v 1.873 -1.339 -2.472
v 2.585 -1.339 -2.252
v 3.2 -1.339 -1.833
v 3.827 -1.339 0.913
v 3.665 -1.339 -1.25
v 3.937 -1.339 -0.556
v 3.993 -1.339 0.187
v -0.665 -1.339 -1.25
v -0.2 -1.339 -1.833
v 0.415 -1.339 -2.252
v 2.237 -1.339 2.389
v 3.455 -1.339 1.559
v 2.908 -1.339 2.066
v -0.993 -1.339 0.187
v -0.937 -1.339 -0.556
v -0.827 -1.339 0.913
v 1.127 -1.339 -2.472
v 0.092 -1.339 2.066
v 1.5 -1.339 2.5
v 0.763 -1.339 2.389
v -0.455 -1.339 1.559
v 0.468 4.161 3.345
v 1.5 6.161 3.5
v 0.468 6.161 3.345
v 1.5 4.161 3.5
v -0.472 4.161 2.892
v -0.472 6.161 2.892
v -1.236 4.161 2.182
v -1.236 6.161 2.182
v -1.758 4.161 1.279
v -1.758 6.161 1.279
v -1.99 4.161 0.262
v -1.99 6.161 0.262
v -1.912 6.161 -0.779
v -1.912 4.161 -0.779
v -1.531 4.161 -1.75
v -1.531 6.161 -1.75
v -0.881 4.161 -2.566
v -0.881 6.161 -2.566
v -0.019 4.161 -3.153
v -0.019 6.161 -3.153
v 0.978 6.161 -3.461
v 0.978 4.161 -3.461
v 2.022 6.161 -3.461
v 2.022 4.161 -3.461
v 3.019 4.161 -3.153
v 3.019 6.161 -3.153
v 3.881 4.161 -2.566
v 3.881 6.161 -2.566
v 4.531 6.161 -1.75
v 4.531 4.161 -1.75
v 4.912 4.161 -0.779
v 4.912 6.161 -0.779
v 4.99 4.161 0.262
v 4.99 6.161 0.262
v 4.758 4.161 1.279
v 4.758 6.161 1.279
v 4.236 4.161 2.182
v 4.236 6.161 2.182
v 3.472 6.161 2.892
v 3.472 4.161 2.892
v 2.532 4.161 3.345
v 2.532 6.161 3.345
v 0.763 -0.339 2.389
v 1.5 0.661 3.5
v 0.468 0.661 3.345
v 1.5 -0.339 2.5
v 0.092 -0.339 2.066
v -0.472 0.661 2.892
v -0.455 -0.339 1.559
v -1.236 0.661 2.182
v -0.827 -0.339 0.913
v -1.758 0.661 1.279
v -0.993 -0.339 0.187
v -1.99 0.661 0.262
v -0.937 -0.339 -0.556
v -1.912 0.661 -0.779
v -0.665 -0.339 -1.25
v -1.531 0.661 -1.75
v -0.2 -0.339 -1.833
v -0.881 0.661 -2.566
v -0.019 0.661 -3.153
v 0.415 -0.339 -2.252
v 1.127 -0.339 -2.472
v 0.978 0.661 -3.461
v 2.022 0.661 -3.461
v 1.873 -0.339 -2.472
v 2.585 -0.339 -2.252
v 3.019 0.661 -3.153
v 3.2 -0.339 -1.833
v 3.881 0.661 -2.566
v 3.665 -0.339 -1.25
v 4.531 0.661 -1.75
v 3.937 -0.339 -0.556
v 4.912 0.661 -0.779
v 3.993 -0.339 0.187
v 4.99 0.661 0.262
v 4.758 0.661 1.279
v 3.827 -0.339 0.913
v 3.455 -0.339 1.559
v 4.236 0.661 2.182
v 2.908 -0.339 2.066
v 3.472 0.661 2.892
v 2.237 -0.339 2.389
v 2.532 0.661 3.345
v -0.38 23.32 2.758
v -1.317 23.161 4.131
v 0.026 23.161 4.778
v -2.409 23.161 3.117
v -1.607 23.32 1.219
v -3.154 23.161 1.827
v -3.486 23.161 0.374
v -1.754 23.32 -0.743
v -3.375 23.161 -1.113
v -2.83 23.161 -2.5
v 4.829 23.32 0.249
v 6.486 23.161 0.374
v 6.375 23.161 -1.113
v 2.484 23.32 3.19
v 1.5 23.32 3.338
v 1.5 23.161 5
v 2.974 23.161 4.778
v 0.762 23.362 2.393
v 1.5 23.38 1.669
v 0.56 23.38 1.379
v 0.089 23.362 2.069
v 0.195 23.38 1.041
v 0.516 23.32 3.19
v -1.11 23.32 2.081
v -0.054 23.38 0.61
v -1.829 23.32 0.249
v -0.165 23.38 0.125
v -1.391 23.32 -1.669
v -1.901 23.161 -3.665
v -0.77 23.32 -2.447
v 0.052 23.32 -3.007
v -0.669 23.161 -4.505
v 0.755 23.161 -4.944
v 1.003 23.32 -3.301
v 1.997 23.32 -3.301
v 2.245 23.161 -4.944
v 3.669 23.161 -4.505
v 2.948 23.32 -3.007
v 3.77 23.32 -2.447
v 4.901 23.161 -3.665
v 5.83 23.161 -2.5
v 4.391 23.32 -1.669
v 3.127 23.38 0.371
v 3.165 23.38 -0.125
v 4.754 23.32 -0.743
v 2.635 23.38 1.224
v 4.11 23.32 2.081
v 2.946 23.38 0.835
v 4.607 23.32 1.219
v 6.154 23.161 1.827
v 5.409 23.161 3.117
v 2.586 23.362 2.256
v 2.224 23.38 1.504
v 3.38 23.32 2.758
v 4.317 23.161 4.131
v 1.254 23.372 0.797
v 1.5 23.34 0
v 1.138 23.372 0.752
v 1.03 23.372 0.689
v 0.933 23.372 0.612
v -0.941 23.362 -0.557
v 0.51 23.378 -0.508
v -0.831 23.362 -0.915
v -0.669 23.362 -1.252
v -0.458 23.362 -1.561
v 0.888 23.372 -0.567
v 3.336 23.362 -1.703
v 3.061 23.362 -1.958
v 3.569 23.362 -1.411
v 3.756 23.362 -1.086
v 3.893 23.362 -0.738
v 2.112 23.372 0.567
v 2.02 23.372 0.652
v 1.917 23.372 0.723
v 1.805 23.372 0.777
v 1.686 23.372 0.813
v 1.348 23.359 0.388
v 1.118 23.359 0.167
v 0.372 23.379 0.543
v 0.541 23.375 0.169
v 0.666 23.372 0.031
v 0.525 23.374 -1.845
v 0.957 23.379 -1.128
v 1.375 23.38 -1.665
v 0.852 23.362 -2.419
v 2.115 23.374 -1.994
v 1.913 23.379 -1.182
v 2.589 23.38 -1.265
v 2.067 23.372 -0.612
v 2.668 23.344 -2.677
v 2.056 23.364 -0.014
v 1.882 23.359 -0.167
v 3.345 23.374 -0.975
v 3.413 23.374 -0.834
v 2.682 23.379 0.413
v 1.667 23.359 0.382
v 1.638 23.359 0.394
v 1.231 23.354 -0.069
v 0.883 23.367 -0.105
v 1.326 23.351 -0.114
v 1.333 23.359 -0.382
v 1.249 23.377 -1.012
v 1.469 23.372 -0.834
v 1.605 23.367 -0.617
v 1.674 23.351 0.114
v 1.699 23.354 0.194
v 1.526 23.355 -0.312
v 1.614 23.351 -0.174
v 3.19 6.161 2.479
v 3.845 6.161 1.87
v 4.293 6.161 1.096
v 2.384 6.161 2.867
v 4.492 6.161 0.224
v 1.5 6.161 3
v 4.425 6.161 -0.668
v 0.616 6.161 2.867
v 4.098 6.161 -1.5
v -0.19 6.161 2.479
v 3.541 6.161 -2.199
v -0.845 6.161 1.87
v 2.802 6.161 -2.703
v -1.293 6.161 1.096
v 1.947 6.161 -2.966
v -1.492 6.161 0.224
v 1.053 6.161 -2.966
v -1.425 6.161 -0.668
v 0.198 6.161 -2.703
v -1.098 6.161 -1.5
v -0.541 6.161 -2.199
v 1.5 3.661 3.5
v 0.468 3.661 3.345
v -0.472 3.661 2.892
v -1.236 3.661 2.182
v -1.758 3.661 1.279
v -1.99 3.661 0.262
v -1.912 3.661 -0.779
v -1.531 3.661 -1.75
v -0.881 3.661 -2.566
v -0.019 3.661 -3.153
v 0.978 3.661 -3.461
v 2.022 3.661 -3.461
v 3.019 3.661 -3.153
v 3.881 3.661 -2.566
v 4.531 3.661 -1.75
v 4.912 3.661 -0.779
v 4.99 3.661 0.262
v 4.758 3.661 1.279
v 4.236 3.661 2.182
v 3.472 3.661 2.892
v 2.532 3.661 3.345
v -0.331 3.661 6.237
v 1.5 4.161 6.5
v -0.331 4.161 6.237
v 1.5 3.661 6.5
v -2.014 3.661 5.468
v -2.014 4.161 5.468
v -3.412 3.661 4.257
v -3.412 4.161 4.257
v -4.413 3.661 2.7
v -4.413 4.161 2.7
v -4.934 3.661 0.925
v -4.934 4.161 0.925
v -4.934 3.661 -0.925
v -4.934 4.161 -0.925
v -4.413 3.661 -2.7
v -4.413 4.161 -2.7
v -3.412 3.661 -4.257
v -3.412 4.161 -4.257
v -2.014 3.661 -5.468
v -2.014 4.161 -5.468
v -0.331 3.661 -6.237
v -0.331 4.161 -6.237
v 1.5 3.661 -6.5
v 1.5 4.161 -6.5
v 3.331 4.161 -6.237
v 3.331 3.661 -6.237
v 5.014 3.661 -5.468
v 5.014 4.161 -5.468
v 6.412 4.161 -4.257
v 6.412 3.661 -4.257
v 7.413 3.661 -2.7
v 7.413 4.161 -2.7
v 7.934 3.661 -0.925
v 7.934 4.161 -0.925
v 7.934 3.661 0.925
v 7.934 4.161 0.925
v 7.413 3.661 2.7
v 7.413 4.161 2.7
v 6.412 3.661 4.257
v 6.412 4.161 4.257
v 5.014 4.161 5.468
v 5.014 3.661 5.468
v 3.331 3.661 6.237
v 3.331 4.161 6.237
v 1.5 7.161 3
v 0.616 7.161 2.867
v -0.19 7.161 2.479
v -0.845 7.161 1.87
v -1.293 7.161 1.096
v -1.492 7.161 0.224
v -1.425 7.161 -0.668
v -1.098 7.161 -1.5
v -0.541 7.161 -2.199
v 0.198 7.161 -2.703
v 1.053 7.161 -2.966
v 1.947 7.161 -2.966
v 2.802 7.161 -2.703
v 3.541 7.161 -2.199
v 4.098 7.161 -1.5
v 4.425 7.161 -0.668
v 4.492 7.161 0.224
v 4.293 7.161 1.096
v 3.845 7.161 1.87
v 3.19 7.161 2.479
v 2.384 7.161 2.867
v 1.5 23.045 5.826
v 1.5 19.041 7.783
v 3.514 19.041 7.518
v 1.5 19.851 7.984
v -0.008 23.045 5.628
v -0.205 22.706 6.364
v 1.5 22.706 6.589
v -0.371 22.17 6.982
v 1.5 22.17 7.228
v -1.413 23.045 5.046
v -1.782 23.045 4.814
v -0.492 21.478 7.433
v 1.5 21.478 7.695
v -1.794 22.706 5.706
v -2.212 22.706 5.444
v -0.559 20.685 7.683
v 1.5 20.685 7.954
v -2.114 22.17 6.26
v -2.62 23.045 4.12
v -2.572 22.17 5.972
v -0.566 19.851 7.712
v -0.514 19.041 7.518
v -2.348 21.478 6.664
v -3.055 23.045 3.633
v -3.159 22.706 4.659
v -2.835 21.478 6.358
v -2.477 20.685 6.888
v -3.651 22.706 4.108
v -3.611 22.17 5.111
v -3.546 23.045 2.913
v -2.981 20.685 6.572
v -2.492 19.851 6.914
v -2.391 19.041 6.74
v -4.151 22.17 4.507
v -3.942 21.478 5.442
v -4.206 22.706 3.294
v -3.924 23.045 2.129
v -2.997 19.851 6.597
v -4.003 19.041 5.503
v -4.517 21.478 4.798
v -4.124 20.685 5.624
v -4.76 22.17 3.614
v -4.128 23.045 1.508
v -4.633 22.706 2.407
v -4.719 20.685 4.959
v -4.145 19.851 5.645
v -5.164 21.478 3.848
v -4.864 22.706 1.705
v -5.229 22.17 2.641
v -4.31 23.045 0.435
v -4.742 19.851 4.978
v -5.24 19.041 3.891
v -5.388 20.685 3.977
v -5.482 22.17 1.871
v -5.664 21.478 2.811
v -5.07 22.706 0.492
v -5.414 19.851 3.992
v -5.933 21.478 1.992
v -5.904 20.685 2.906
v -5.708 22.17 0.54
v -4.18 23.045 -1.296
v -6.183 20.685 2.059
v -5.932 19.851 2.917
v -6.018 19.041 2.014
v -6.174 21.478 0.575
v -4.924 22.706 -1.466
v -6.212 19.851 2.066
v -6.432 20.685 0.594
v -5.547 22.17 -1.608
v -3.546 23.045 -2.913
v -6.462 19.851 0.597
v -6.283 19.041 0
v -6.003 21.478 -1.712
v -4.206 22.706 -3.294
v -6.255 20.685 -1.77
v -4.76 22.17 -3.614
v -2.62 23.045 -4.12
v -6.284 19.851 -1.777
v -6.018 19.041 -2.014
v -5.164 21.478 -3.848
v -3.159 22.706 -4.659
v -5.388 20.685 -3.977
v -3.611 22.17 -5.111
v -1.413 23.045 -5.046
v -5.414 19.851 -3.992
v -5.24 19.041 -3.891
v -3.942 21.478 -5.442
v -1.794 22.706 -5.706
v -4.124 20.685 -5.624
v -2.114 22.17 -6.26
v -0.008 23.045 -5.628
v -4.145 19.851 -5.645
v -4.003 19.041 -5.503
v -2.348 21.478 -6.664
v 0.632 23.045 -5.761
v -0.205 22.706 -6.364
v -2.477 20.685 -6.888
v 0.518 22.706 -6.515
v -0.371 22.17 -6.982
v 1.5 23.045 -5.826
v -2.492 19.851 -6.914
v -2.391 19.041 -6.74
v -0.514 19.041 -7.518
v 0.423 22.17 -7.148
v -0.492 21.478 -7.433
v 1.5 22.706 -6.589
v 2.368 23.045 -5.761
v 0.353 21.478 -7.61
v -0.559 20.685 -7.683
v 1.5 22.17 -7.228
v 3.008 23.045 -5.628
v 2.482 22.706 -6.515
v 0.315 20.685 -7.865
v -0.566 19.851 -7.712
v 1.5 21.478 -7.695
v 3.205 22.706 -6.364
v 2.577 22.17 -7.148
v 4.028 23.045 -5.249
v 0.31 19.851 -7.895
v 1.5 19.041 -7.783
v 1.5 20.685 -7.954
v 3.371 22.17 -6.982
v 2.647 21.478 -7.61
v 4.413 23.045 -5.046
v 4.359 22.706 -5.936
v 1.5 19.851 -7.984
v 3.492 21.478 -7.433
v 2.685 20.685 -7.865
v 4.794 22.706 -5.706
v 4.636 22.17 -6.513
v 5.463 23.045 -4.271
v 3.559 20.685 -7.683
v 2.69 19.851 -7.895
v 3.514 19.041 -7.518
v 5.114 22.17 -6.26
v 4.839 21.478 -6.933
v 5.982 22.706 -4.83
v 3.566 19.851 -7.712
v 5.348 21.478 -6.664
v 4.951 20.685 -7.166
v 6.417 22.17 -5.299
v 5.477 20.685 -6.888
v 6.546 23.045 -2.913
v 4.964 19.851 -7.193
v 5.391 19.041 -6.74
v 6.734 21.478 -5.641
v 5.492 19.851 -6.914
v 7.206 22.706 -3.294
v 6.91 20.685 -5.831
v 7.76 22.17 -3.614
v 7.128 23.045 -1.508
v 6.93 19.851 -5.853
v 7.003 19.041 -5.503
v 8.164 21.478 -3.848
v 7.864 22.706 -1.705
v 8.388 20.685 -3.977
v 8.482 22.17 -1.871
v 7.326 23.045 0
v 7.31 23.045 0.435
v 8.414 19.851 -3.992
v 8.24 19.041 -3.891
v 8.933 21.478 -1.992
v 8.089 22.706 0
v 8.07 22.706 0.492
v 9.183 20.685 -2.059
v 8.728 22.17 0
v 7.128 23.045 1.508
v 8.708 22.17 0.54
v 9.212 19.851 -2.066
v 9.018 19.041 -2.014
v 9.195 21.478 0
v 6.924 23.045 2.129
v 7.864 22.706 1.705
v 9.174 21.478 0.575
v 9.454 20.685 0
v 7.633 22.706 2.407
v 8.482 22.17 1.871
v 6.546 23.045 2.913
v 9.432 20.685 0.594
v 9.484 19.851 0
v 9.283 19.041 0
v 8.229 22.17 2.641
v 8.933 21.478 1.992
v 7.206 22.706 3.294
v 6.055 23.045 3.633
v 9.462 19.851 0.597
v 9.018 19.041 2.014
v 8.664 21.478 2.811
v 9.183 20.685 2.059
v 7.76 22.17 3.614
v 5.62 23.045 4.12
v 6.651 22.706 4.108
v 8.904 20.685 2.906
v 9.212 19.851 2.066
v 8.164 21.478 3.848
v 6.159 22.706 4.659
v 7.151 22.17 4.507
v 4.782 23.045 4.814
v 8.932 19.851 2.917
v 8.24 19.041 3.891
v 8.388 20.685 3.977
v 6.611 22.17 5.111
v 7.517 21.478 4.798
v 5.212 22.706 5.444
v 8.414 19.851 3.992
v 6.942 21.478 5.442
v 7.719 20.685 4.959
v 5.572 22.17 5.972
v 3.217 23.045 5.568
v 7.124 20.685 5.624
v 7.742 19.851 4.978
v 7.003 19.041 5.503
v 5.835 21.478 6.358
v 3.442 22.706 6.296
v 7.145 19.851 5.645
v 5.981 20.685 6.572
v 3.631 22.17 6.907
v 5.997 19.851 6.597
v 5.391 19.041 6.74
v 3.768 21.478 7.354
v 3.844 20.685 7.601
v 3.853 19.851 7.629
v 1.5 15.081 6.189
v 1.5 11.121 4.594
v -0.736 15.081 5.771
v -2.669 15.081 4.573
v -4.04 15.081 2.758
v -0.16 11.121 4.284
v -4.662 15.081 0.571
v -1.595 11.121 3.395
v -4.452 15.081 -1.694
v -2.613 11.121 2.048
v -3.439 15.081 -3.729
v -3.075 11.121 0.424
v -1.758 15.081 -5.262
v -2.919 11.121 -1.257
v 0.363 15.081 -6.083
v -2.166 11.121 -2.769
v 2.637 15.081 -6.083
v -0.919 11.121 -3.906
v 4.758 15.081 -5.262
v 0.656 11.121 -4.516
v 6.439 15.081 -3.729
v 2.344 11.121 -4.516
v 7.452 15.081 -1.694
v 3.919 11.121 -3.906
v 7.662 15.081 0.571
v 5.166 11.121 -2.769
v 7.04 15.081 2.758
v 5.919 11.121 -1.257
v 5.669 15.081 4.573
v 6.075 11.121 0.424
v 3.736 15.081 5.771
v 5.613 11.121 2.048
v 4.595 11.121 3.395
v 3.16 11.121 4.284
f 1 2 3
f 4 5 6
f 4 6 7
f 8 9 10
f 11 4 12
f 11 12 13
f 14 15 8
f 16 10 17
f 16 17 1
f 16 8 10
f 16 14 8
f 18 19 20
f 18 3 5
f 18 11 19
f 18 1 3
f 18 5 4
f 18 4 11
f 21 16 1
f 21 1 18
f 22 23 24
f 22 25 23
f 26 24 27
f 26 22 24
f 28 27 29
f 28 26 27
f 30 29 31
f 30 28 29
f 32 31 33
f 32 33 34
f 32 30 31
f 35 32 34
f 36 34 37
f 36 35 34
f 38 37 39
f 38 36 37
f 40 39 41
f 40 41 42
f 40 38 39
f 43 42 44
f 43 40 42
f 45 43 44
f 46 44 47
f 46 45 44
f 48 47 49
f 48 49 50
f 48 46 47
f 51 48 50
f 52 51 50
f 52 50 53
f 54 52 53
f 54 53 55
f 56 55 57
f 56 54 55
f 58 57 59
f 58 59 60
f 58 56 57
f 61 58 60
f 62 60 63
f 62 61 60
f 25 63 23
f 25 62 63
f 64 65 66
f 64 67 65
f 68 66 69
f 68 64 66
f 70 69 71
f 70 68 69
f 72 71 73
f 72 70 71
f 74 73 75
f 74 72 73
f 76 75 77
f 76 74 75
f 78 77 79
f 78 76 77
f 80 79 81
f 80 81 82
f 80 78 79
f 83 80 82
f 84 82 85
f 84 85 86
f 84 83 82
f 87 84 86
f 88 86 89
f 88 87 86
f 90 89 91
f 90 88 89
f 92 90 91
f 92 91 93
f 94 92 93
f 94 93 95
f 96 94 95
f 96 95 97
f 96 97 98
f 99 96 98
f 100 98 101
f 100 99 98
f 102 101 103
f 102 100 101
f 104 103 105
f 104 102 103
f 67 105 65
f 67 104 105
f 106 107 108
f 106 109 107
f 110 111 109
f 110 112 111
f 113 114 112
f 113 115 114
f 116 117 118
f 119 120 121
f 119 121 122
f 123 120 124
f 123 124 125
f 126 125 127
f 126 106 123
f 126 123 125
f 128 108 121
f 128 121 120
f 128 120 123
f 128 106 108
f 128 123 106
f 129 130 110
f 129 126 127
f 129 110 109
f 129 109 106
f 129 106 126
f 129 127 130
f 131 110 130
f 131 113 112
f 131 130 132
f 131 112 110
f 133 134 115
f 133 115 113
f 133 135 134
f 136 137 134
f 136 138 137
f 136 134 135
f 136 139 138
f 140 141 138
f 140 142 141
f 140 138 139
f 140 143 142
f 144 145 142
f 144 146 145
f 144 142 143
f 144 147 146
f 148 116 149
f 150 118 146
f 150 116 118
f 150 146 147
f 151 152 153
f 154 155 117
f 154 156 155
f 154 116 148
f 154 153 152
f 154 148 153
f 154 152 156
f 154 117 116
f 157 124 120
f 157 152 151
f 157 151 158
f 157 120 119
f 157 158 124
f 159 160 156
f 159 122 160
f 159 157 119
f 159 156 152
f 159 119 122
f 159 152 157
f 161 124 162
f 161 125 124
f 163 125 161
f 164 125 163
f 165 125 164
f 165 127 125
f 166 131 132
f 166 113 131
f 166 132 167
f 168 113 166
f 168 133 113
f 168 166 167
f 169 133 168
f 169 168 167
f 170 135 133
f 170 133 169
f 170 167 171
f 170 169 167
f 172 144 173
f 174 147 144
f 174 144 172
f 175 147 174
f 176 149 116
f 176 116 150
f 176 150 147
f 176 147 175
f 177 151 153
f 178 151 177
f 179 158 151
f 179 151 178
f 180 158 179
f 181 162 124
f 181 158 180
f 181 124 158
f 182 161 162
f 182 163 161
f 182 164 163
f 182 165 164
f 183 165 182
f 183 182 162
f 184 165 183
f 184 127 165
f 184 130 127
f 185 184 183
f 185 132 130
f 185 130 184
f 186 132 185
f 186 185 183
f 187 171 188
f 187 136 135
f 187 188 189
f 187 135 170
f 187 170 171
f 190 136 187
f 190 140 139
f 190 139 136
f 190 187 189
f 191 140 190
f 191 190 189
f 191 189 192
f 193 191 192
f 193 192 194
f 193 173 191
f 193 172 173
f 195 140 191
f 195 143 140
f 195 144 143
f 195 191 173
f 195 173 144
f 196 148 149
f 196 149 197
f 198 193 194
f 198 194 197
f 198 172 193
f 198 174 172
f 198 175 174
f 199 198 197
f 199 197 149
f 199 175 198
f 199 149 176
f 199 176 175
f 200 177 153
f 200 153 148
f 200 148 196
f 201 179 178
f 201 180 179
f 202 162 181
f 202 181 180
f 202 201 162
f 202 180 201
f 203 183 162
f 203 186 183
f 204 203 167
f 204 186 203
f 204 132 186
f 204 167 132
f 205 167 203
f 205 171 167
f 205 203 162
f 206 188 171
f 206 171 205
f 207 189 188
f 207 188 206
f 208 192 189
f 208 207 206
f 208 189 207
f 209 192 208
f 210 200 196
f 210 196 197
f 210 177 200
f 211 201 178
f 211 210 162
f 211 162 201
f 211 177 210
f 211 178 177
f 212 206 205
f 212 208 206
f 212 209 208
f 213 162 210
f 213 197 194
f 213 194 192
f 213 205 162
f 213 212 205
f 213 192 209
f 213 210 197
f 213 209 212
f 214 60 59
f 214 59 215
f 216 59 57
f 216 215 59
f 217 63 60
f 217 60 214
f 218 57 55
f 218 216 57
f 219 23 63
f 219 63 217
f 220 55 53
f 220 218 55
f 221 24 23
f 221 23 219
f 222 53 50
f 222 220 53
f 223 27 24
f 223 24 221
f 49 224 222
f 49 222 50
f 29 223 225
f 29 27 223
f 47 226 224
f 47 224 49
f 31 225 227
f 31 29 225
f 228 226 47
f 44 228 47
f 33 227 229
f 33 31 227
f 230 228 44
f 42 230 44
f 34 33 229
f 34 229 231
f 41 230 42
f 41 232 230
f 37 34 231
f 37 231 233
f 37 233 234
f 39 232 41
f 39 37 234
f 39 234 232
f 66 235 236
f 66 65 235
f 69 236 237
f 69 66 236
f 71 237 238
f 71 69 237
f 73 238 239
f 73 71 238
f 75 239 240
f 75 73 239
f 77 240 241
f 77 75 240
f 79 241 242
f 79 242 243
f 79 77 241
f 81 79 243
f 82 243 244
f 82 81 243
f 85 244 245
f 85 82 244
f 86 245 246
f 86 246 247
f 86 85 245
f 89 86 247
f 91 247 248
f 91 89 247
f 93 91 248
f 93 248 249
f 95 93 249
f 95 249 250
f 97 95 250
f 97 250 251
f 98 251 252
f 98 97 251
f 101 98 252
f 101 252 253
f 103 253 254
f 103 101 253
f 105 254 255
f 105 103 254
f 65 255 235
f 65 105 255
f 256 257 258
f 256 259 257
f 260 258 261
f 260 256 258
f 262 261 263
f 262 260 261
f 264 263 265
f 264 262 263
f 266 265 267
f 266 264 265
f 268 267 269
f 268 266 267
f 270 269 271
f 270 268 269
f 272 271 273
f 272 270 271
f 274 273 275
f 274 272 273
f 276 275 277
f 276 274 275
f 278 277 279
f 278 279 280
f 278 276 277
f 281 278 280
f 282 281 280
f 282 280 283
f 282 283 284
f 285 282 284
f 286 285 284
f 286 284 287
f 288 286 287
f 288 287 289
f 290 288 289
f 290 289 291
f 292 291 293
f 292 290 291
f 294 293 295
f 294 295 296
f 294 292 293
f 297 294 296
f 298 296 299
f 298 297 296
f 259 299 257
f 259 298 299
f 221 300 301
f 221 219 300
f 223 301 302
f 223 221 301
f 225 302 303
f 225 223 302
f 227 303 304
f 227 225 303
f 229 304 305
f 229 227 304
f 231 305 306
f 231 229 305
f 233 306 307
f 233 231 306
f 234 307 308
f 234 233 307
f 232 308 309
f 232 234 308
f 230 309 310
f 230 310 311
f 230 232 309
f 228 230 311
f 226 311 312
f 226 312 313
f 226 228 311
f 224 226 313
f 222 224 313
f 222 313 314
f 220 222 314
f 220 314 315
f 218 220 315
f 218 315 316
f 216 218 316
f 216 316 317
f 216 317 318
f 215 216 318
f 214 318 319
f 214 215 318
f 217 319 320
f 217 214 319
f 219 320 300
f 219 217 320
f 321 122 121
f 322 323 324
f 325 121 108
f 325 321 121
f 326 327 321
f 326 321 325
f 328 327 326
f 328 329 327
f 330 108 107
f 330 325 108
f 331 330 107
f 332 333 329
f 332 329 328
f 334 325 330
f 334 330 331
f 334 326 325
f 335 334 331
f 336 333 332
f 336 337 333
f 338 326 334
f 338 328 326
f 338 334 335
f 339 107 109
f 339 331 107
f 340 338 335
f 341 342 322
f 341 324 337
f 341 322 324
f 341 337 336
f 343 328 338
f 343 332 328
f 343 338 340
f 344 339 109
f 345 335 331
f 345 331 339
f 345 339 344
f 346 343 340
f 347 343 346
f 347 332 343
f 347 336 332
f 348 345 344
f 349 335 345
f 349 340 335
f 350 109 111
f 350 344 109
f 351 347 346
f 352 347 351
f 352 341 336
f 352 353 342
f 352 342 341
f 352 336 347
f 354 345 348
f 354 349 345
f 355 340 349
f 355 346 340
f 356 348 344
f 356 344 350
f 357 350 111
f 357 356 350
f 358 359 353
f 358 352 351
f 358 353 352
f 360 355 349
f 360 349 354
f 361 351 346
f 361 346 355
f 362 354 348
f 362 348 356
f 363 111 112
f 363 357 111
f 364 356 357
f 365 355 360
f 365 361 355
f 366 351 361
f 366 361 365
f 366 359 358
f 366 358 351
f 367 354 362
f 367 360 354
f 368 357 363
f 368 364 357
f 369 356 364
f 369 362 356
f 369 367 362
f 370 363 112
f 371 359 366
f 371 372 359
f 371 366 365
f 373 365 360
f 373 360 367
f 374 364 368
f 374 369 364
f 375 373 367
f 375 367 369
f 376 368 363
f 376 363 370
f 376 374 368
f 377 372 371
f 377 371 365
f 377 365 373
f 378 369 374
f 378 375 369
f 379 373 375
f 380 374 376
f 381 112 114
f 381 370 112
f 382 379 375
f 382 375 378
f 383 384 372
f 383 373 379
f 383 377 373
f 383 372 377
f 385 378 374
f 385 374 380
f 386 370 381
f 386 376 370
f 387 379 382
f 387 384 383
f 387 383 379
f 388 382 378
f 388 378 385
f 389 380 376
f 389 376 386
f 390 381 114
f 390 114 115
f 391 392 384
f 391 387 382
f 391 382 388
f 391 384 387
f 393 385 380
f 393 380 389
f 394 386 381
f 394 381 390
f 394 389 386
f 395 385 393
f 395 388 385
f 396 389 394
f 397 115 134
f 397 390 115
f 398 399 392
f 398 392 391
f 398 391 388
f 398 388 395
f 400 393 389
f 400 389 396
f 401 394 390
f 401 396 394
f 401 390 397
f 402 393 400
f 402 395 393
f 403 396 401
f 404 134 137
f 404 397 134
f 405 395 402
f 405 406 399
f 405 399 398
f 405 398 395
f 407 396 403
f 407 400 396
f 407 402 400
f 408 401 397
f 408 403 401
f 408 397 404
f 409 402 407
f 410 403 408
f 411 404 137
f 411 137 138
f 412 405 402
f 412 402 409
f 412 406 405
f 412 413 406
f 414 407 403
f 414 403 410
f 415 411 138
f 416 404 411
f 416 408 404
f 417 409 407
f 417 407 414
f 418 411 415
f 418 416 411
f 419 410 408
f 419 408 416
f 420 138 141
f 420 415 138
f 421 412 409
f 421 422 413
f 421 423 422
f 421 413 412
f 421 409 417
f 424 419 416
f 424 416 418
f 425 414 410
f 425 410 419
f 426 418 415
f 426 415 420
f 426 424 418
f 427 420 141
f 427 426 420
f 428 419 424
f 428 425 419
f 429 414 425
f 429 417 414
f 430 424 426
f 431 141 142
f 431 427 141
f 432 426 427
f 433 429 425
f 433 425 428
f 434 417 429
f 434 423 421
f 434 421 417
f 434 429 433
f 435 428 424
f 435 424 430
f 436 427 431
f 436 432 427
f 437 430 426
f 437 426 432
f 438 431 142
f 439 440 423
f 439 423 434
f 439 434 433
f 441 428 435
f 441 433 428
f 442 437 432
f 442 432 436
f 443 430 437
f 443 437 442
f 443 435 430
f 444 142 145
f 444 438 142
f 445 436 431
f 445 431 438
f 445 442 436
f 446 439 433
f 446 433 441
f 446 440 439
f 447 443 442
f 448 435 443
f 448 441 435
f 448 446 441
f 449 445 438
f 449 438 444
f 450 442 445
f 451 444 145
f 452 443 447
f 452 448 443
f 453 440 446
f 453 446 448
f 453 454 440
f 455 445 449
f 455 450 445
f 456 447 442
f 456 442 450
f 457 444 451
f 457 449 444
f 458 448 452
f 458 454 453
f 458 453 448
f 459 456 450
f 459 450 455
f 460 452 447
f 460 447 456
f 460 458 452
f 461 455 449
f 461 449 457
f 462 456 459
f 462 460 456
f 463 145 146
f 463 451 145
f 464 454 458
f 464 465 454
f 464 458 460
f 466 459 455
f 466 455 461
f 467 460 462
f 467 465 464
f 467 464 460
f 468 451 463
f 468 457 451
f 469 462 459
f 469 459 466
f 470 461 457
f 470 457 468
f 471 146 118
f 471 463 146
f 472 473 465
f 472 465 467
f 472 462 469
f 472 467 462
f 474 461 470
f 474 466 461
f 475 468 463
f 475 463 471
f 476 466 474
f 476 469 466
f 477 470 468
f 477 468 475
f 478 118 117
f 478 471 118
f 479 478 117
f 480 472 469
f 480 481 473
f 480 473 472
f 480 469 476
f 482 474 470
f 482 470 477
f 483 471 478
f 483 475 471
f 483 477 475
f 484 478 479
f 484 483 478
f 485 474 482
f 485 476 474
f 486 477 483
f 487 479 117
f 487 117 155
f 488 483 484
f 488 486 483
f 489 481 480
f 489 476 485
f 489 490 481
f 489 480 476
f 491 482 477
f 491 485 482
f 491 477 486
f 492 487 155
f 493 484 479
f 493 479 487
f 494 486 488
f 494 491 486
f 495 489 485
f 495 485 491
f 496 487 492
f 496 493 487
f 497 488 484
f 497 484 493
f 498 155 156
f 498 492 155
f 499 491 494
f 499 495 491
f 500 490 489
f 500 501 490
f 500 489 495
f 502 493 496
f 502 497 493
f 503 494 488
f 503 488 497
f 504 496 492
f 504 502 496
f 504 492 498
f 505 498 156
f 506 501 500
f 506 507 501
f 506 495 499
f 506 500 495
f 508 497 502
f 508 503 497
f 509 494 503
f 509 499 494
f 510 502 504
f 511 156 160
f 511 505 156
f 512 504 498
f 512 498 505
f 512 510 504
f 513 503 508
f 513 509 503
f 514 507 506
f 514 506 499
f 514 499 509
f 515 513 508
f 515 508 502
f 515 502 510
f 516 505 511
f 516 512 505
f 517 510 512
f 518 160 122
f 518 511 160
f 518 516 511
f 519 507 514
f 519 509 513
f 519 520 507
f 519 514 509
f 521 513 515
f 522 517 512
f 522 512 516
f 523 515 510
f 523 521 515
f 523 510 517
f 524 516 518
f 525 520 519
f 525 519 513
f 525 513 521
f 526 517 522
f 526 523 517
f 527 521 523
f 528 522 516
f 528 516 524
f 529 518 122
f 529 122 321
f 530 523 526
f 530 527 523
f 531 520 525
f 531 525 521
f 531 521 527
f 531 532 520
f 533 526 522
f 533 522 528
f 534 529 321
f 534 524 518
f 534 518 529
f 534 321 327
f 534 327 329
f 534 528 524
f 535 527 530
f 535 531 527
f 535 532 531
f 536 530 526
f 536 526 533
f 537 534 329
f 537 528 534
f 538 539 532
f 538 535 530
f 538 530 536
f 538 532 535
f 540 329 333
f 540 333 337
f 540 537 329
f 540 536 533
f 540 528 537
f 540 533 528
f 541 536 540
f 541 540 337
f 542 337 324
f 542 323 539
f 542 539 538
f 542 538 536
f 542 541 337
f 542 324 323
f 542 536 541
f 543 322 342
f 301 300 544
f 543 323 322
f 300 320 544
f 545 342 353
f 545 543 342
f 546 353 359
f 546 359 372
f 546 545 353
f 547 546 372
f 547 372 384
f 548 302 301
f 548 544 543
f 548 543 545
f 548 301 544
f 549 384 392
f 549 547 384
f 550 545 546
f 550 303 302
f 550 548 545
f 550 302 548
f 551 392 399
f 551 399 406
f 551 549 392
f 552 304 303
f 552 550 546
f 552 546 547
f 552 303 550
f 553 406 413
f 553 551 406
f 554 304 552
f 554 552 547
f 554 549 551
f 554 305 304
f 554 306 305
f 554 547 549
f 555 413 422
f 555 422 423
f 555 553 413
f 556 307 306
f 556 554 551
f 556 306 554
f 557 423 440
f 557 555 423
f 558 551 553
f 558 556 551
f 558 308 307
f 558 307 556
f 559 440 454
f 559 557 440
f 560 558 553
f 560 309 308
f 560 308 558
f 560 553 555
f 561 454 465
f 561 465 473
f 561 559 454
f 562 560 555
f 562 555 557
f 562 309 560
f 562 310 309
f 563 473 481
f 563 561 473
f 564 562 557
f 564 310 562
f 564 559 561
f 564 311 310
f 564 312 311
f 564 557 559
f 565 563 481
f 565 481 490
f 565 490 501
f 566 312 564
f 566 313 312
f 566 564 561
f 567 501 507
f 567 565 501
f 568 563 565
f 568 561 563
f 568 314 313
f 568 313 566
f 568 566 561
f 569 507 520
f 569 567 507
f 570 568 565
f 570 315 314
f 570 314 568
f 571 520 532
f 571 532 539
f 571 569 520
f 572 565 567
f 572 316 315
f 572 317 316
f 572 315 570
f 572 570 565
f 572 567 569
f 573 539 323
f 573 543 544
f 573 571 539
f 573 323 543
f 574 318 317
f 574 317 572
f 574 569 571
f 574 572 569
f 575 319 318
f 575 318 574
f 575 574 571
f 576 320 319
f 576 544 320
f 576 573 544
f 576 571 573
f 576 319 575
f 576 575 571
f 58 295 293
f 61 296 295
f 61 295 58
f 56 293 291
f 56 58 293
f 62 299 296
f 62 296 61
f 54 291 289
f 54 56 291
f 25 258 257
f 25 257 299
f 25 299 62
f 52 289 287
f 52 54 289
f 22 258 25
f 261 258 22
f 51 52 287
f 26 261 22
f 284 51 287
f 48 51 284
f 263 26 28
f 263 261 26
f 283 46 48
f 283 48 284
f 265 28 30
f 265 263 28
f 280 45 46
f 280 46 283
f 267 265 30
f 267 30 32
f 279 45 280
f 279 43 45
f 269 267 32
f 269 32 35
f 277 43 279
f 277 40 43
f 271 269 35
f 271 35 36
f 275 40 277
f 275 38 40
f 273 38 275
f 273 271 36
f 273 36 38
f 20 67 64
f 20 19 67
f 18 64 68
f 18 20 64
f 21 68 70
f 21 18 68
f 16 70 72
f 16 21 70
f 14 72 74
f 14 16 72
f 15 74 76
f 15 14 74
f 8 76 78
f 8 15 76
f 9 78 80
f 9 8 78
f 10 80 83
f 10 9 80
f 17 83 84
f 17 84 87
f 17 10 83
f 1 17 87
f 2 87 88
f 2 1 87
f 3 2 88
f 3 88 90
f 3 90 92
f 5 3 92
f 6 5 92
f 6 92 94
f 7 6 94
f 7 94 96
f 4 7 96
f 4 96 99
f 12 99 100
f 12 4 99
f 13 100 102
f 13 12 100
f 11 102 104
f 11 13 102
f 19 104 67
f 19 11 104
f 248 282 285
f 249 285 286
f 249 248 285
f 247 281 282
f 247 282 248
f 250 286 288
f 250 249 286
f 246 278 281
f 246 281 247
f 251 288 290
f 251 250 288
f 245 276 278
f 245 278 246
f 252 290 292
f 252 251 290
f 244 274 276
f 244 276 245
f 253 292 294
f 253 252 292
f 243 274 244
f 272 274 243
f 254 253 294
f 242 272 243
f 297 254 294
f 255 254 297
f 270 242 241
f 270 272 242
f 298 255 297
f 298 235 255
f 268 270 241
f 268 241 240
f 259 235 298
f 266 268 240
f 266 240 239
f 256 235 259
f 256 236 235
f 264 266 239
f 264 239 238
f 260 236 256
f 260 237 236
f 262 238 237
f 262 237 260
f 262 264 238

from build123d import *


with BuildPart() as part:
    # Sketch1 → Revolve1 (revolve)
    with BuildSketch(Plane.XY, mode=Mode.PRIVATE) as revolve1_sk:
        with BuildLine():
            Line((-6.282911506, 19.040573868), (-1.5, 7.161021792))
            Line((-1.5, 7.161021792), (-1.5, 6.161021792))
            Line((-1.5, 6.161021792), (-2, 6.161021792))
            Line((-2, 6.161021792), (-2, 4.161021792))
            Line((-2, 4.161021792), (-5, 4.161021792))
            Line((-5, 4.161021792), (-5, 3.661021792))
            Line((-5, 3.661021792), (-2, 3.661021792))
            Line((-2, 3.661021792), (-2, 0.661021792))
            Line((-2, 0.661021792), (-1, -0.338978208))
            Line((-1, -0.338978208), (-1, -1.338978208))
            Line((-1, -1.338978208), (1.5, -1.338978208))
            Line((1.5, -1.338978208), (1.5, 23.340167272))
            ThreePointArc((1.5, 23.340167272), (-1.004003623, 23.36233677), (-3.5, 23.161021792))
            ThreePointArc((-3.5, 23.161021792), (-5.986095711, 21.840107292), (-6.282911506, 19.040573868))
        make_face()
    revolve(revolve1_sk.sketch.rotate(Axis((1.5, 32.403614304, 0), (0, -1, 0)), 270), axis=Axis((1.5, 32.403614304, 0), (0, -1, 0)))


solid = part.part
